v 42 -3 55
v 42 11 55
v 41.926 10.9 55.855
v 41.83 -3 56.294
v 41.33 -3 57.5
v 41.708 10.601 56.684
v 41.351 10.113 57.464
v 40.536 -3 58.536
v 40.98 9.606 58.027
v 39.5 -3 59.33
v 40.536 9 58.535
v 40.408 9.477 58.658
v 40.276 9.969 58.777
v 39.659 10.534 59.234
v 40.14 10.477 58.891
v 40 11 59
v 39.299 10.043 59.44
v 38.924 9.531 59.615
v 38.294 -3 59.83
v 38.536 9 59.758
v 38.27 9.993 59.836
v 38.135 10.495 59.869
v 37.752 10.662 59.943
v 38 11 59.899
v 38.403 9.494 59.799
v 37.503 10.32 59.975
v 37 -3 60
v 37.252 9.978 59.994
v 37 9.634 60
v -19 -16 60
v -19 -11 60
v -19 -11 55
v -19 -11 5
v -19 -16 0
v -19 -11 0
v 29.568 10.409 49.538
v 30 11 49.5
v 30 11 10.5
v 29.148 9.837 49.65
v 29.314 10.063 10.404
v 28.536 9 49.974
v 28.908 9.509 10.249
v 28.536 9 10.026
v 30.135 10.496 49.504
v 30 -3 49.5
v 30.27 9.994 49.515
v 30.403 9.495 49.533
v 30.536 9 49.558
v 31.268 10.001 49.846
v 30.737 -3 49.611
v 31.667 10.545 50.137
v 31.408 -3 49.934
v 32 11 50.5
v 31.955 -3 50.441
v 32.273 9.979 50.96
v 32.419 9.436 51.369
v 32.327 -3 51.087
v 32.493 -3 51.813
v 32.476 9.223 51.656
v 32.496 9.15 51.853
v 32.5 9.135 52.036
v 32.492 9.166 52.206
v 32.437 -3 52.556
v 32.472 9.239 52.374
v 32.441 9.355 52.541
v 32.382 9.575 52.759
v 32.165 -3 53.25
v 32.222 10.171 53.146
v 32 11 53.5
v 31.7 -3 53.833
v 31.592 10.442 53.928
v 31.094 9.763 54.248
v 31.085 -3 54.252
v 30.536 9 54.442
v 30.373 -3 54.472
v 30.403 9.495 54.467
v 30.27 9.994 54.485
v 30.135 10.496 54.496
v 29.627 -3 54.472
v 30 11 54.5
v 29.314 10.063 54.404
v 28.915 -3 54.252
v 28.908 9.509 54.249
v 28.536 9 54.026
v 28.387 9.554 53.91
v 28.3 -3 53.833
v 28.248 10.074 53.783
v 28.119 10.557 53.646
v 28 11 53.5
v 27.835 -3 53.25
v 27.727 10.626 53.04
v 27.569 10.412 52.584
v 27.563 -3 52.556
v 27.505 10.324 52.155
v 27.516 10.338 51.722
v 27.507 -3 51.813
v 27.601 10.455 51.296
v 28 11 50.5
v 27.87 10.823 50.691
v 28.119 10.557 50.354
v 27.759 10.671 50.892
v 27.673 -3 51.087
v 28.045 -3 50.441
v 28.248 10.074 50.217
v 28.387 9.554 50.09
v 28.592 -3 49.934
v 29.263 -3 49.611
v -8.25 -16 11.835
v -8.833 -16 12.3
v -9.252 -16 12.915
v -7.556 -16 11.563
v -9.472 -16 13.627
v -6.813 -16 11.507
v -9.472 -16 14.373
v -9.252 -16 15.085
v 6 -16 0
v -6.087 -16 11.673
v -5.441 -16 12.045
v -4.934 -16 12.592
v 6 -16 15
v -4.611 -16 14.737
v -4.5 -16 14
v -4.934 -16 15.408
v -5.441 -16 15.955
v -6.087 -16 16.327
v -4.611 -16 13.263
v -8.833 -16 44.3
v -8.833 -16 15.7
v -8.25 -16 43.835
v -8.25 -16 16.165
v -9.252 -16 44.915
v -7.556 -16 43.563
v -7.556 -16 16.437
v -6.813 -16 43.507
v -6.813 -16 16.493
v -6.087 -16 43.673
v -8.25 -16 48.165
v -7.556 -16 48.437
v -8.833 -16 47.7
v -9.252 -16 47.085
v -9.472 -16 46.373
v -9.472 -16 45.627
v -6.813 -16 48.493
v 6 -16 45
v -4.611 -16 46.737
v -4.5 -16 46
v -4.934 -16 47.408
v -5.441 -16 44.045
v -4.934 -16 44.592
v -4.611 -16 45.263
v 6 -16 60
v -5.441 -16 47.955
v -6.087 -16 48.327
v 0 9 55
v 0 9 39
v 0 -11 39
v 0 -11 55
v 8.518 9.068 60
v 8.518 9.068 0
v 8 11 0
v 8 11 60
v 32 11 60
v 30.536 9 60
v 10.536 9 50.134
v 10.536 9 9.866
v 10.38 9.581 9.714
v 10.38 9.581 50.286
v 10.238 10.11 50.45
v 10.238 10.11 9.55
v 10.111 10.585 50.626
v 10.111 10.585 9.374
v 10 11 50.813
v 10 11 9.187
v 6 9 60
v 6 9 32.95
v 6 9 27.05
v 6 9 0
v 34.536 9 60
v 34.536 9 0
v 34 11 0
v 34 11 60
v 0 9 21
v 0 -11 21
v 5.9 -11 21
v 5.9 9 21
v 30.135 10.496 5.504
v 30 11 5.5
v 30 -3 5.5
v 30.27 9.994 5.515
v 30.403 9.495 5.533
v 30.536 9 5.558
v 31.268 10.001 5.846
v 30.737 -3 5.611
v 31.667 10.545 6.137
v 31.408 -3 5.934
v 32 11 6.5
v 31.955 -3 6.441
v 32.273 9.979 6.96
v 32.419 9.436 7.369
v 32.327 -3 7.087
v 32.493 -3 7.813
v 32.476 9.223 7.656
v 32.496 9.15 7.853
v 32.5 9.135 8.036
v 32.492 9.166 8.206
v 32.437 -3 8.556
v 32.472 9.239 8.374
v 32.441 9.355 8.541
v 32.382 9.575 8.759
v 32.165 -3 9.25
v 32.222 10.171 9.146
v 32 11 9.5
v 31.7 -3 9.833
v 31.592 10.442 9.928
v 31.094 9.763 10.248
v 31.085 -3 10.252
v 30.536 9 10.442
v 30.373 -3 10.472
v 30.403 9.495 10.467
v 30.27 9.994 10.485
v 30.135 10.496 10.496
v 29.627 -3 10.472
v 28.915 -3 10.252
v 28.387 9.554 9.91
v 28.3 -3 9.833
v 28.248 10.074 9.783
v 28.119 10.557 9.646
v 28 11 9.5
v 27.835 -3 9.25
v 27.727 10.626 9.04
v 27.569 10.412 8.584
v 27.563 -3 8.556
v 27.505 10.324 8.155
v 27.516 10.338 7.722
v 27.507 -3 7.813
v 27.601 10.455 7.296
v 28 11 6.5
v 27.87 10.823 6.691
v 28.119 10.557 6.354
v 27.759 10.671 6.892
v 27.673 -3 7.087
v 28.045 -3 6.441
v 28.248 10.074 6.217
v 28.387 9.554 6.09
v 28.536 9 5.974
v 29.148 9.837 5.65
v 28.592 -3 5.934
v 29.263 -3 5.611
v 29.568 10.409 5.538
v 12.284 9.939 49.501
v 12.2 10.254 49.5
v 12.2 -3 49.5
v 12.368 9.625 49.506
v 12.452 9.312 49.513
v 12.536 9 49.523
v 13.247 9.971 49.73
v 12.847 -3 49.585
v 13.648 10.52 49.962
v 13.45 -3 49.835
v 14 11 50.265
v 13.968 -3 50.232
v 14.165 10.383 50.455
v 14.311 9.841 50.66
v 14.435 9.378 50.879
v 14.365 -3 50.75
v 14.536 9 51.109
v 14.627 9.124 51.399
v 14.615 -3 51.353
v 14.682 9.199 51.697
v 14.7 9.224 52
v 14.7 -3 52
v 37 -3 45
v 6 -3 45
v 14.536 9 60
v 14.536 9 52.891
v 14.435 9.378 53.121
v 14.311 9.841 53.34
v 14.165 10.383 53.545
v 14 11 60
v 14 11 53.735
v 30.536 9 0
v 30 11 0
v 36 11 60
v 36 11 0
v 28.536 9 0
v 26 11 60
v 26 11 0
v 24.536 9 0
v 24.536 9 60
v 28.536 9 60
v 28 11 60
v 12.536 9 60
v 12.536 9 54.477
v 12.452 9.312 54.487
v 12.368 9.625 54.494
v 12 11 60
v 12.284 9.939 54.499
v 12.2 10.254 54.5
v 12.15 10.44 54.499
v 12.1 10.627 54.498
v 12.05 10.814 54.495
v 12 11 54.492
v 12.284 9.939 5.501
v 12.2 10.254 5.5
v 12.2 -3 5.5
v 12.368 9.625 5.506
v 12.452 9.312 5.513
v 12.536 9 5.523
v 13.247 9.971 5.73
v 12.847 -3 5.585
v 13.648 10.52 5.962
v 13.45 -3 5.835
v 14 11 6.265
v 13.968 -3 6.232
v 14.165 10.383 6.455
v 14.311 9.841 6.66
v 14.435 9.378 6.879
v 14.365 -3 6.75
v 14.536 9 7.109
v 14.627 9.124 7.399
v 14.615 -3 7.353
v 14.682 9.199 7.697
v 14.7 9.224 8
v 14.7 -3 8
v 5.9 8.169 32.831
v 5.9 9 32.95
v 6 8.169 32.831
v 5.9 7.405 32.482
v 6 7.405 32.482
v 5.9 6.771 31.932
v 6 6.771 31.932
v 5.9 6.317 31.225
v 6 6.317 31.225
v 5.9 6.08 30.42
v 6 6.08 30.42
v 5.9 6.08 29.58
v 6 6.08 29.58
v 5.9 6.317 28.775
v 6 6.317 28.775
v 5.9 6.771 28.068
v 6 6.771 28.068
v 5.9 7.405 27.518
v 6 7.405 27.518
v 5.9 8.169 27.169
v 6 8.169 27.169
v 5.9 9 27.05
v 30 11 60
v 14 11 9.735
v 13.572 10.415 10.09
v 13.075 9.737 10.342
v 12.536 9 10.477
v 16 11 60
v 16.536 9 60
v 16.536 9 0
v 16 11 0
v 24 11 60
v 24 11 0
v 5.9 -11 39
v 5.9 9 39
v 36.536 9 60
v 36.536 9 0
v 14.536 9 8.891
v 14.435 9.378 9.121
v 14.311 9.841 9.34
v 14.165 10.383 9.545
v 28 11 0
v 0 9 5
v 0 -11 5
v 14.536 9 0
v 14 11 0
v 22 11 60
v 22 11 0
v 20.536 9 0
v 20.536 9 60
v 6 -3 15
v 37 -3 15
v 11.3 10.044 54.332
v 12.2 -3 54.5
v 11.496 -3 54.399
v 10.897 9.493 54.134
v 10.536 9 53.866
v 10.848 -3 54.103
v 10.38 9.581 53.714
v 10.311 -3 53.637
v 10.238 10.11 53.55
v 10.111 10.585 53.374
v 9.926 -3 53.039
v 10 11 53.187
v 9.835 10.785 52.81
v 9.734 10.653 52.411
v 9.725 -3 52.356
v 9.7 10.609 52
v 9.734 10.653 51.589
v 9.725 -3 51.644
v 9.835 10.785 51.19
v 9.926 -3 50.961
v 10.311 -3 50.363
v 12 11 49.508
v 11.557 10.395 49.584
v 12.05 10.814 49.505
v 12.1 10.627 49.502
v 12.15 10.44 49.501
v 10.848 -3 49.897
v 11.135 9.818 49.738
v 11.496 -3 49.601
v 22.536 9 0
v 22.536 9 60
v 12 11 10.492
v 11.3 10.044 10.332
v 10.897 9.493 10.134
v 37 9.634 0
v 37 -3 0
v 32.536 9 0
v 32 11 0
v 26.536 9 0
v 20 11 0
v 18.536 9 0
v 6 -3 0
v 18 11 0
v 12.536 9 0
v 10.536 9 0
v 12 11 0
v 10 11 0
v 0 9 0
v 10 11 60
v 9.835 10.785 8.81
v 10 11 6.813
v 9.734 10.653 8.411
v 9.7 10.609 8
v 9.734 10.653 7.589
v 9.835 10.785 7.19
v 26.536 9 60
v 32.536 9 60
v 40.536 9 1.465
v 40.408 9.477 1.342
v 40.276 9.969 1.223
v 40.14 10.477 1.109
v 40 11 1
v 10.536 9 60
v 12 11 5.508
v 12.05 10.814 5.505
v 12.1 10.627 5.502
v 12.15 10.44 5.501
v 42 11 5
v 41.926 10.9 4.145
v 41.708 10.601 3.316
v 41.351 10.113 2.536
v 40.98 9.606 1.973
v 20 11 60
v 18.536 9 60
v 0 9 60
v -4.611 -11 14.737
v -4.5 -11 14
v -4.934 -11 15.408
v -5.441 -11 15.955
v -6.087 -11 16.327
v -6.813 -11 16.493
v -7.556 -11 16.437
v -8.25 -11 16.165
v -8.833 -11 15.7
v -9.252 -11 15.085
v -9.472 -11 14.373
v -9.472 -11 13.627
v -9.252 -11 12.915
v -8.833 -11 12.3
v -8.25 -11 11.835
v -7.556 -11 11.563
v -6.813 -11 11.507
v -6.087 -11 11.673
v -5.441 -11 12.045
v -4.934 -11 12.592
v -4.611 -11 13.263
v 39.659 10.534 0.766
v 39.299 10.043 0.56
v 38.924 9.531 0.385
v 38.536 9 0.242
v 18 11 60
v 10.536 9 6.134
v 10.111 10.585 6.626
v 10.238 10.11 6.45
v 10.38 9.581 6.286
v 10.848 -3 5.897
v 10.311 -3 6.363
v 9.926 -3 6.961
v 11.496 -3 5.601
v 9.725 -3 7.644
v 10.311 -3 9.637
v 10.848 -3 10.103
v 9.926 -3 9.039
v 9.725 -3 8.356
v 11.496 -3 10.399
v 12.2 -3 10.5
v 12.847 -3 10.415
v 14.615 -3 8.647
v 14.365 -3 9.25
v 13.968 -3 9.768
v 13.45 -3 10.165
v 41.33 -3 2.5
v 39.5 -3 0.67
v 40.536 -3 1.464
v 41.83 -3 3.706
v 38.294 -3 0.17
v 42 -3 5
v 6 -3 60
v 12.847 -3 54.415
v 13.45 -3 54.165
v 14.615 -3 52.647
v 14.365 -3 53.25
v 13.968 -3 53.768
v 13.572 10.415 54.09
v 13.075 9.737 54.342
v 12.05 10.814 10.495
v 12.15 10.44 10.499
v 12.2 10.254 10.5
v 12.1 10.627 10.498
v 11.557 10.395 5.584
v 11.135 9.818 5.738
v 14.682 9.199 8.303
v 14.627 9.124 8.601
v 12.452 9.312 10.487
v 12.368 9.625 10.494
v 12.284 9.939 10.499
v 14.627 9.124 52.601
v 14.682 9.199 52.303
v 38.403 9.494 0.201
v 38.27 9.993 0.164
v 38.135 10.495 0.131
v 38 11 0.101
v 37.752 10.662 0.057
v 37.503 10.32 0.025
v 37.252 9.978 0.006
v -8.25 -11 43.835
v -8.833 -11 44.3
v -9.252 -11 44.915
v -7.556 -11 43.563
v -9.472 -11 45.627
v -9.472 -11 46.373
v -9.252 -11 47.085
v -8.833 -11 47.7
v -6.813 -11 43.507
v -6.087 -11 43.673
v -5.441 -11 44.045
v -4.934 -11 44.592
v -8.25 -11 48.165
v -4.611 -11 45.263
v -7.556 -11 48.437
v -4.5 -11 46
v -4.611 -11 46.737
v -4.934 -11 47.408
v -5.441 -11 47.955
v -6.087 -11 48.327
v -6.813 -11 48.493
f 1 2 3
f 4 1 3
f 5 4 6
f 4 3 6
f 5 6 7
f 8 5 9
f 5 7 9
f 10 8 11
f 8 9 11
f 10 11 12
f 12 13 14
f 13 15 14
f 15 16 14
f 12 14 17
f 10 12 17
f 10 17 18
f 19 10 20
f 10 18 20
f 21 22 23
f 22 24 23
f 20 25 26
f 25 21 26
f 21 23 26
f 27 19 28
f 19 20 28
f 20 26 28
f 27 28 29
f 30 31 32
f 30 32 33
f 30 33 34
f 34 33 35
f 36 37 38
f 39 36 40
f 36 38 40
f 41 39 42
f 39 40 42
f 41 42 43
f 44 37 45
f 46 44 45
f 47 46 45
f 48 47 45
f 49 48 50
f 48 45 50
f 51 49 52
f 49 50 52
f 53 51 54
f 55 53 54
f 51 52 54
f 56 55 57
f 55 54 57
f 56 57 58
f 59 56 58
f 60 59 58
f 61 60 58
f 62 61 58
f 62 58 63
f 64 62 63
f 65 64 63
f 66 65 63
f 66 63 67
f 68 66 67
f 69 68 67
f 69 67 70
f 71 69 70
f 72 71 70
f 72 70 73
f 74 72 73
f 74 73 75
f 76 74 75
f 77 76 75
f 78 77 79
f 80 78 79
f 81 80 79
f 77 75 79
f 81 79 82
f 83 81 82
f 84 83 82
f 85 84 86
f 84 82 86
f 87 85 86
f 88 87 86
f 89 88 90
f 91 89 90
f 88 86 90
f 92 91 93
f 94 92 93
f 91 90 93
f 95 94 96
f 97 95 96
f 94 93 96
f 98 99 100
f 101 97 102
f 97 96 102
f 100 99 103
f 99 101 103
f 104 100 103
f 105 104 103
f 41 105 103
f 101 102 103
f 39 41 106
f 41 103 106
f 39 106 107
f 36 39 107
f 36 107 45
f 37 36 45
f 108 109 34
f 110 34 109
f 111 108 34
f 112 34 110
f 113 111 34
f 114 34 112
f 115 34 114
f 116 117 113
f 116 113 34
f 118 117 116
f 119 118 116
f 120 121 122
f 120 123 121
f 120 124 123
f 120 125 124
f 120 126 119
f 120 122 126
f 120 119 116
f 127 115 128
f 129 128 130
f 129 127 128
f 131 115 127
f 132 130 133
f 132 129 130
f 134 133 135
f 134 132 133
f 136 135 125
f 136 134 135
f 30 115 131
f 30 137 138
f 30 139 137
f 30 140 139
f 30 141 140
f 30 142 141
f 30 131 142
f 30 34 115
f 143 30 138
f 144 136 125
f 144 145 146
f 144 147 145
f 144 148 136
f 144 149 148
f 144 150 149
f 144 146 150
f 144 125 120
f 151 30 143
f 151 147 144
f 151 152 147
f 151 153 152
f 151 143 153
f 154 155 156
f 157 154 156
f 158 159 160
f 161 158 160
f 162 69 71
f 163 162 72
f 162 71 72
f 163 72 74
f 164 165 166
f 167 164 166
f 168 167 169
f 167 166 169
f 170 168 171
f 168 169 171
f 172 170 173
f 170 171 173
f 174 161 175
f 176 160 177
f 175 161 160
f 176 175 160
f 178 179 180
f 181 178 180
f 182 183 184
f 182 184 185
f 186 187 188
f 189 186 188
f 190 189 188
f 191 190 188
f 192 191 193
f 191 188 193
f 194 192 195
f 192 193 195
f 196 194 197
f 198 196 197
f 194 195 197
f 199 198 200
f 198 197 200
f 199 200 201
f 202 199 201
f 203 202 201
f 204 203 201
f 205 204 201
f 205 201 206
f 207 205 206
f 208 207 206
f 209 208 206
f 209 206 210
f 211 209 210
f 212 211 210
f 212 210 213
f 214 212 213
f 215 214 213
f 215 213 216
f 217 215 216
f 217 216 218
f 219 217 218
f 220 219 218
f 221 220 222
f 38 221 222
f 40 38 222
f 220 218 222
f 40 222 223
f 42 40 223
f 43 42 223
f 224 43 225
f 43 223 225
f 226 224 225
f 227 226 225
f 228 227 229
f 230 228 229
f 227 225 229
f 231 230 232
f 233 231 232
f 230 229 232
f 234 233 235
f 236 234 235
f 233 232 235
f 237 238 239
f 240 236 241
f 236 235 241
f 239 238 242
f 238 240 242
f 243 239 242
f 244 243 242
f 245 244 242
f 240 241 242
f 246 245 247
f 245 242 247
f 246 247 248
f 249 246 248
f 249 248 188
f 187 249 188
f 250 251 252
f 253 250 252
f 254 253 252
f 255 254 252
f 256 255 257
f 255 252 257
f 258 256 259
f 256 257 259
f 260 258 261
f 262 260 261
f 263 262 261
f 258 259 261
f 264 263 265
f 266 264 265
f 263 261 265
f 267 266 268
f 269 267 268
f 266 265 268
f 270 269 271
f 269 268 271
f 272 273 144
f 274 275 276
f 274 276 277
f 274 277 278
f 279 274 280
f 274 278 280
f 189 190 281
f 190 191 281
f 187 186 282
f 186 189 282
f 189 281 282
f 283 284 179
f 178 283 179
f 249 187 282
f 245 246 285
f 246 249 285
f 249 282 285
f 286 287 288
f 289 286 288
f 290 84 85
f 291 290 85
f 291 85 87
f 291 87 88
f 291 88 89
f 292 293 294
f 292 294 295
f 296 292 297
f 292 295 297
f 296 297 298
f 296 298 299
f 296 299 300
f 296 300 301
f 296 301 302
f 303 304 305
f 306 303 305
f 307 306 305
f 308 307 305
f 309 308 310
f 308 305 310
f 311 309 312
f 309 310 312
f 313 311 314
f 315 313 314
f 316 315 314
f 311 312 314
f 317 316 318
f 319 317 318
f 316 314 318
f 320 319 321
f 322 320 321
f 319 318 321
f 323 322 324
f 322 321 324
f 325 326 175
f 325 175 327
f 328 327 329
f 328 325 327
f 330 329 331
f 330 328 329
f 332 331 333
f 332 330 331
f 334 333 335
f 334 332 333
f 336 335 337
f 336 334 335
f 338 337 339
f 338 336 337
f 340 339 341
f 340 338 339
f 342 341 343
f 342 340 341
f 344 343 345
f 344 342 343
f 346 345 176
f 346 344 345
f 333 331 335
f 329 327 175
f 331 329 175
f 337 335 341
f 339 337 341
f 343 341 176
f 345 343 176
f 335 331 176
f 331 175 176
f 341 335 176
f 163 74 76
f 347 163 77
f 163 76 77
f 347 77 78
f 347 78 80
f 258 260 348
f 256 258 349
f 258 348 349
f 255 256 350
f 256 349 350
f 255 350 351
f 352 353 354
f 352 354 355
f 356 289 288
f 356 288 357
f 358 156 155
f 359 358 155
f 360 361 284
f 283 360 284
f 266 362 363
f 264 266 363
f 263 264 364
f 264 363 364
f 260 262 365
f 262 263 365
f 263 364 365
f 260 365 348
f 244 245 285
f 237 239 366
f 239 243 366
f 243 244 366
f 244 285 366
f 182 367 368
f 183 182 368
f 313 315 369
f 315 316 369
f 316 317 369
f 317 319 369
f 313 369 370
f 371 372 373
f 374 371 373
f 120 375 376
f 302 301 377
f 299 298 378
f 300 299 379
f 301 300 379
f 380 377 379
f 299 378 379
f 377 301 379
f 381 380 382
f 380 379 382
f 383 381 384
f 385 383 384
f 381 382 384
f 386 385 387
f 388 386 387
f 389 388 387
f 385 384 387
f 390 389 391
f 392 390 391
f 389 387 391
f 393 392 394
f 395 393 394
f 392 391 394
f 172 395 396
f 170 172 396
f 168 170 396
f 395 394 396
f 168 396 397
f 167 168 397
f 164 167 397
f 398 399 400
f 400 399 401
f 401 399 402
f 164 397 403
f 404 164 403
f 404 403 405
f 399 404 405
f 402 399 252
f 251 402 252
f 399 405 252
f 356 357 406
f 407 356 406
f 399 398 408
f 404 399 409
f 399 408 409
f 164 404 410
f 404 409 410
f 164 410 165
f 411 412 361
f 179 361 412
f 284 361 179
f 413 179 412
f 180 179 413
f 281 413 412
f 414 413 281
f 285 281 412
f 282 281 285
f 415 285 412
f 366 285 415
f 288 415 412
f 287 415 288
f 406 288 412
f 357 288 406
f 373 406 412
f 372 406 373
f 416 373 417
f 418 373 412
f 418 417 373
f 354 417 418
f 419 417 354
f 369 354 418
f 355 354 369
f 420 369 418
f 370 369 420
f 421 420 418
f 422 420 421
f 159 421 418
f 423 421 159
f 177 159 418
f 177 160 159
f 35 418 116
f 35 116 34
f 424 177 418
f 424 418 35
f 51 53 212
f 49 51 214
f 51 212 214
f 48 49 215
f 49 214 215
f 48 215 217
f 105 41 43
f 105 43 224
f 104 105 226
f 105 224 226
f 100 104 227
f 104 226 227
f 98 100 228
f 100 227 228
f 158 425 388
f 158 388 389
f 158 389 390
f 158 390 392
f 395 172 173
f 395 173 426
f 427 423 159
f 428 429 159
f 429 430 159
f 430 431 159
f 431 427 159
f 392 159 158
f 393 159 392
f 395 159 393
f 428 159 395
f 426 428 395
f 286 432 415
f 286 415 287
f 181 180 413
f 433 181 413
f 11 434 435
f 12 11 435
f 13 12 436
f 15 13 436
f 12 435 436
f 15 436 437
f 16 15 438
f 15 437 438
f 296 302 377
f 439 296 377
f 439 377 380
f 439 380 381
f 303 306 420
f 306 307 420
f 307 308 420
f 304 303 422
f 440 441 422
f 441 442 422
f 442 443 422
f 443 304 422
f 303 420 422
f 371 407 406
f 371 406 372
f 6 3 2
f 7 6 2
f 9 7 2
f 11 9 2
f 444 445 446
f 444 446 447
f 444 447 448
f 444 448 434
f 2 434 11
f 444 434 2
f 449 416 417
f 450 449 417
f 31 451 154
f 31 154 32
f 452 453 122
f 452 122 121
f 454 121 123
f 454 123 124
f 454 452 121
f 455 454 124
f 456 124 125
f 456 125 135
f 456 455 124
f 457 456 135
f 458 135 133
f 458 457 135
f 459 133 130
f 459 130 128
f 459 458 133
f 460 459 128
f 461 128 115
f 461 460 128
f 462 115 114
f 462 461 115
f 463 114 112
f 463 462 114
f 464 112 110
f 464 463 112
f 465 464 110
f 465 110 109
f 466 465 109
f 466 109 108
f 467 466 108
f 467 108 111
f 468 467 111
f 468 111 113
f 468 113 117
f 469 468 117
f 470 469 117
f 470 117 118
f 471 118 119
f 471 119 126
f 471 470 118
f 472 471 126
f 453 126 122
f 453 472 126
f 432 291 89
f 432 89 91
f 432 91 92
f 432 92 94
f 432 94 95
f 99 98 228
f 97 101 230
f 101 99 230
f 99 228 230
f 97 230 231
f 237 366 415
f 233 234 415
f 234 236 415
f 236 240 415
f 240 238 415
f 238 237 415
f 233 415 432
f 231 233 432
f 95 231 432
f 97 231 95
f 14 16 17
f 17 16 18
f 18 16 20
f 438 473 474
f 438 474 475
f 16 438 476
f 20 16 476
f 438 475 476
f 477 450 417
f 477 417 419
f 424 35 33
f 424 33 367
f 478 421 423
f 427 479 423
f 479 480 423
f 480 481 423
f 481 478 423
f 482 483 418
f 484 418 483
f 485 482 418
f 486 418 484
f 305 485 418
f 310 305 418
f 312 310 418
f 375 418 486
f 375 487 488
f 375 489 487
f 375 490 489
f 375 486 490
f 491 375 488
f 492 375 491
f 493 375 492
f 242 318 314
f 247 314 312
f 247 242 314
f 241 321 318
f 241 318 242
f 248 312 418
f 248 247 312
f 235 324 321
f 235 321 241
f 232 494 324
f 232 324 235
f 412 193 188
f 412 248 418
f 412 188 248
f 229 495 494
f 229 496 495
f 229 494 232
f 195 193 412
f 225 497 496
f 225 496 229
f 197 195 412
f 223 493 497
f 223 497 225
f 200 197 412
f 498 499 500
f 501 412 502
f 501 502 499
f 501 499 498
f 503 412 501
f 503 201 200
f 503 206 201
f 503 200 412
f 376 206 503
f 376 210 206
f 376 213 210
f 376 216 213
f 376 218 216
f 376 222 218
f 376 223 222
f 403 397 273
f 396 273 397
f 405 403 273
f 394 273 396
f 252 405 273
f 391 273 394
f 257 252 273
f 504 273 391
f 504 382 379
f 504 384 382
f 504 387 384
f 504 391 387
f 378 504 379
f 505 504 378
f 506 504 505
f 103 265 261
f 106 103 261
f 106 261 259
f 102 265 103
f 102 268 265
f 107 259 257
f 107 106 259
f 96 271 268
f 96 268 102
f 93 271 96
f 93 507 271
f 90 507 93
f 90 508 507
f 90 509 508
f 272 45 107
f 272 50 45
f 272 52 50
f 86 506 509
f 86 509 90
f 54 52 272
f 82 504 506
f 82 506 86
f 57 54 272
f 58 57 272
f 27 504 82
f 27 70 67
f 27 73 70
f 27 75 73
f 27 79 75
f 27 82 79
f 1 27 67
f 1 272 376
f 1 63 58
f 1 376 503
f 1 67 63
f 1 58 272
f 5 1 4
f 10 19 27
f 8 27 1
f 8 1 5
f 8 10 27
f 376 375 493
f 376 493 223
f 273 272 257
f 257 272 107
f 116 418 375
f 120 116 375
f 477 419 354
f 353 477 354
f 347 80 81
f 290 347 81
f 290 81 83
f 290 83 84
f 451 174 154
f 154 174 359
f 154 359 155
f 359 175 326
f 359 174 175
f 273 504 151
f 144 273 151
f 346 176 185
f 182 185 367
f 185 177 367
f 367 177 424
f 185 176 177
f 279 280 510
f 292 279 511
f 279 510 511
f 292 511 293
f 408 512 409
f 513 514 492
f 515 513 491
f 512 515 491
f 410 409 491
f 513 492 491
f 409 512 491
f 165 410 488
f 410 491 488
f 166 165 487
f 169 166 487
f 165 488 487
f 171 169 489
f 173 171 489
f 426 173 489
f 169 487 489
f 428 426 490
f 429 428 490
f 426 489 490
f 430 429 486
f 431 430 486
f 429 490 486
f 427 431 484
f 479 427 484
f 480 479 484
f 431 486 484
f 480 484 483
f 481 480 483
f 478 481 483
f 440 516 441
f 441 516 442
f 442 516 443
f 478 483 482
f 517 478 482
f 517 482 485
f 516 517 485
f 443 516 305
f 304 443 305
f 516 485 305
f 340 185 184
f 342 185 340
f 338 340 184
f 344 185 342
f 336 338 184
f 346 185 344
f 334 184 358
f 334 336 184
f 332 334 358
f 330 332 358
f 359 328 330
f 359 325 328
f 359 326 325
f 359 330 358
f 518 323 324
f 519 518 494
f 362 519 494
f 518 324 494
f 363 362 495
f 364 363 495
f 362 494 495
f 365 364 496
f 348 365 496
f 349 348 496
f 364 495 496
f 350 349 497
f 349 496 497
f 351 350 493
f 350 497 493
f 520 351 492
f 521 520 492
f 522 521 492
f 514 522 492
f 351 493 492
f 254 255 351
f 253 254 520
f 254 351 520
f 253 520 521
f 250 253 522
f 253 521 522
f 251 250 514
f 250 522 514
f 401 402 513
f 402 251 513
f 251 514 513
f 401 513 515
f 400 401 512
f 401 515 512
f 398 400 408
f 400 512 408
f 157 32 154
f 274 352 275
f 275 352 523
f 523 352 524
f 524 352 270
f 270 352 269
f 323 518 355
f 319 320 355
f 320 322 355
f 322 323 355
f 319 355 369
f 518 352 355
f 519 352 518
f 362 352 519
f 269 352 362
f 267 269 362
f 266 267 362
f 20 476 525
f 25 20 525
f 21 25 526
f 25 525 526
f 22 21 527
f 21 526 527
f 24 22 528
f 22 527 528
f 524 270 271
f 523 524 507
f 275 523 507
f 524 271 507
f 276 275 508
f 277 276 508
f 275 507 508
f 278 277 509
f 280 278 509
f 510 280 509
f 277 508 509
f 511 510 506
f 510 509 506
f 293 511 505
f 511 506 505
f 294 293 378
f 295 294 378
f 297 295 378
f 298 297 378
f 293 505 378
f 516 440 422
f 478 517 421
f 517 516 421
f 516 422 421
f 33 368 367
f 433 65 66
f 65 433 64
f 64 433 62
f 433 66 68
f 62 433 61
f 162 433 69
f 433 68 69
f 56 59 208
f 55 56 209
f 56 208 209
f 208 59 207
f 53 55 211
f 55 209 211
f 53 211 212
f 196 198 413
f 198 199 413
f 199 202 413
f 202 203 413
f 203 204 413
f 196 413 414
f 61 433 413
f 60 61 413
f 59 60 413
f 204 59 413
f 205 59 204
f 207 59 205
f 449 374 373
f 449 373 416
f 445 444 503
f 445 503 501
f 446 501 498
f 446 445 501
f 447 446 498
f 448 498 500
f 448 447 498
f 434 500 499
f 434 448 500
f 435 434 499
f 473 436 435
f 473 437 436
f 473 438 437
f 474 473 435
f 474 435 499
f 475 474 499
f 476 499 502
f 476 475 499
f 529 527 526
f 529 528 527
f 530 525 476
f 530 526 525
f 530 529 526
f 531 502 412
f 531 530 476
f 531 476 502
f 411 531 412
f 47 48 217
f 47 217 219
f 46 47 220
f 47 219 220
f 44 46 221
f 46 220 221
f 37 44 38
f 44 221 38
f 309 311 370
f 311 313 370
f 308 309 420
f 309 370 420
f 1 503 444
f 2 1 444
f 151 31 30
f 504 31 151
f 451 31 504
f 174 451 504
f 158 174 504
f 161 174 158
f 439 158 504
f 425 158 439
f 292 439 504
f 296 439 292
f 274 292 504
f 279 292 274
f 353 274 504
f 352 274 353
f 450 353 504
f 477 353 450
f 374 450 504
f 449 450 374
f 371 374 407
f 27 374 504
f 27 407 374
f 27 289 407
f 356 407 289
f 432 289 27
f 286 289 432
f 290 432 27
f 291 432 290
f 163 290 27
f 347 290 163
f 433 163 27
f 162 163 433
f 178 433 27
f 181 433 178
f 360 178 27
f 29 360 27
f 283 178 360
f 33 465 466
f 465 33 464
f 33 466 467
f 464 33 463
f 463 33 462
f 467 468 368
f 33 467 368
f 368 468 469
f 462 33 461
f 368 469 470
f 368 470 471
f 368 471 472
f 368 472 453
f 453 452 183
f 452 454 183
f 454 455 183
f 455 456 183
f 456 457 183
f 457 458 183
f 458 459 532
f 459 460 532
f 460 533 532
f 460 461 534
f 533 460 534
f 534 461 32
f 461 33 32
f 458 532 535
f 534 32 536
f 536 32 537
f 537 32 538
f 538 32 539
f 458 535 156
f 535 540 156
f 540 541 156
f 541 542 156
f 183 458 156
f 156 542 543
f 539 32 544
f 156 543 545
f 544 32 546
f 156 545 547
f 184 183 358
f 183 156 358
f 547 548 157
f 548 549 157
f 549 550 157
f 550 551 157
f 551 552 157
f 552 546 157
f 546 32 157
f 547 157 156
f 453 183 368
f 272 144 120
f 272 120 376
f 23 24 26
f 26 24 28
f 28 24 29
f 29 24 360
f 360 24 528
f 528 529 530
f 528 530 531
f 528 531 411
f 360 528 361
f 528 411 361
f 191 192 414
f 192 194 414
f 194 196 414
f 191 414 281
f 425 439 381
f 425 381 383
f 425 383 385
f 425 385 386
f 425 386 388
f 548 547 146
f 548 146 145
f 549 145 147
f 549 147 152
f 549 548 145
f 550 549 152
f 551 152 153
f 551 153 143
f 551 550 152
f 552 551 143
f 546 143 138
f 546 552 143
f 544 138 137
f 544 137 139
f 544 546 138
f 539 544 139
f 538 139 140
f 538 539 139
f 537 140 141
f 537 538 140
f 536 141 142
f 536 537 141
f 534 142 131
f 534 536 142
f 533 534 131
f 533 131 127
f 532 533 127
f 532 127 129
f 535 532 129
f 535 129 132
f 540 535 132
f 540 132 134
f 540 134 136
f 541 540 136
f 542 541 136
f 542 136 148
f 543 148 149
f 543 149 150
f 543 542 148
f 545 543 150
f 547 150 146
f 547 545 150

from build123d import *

# Parameters (mm, degrees)
EXTRUDE_1_DEPTH     = 60
FILLET_1_R          = 5
SKETCH_3_R          = 2.5
CUT_EXTRUDE_2_DEPTH = 77.472217177
CUT_EXTRUDE_4_DEPTH = 6
SKETCH_6_W          = 18
SKETCH_6_H          = 20
CUT_EXTRUDE_5_DEPTH = 5.9
SKETCH_7_R          = 2.5
EXTRUDE_2_DEPTH     = 5
CUT_EXTRUDE_START   = -8
CUT_EXTRUDE_6_DEPTH = 8
EXTRUDE_3_DEPTH     = 5
EXTRUDE_4_DEPTH     = 5
EXTRUDE_5_DEPTH     = 45
CUT_EXTRUDE_7_DEPTH = 15


with BuildPart() as part:
    # 草图1 → 凸台-拉伸1 (new body)
    with BuildSketch(Plane.XY):
        Polygon((0, 9), (0, -11), (42, -11), (42, 11), (40.535898385, 9), (40, 11), (38.535898385, 9), (38, 11), (36.535898385, 9), (36, 11), (34.535898385, 9), (34, 11), (32.535898385, 9), (32, 11), (30.535898385, 9), (30, 11), (28.535898385, 9), (28, 11), (26.535898385, 9), (26, 11), (24.535898385, 9), (24, 11), (22.535898385, 9), (22, 11), (20.535898385, 9), (20, 11), (18.535898385, 9), (18, 11), (16.535898385, 9), (16, 11), (14.535898385, 9), (14, 11), (12.535898385, 9), (12, 11), (10.535898385, 9), (10, 11), (8.51763809, 9.068148347), (8, 11), (6, 9), align=None)
    extrude(amount=EXTRUDE_1_DEPTH)

    # 圆角1
    fillet_1_edges = [part.edges().sort_by_distance(p)[0] for p in [
        (42, 0, 0),
        (42, 0, 60),
    ]]
    fillet(fillet_1_edges, radius=FILLET_1_R)

    # 草图3 → 切除-拉伸2 (cut, through all)
    with BuildSketch(Plane.XZ.offset(11)):
        with Locations(Location((30, 8, 0), (0, 0, 270))):
            Circle(SKETCH_3_R)
        with BuildLine():
            ThreePointArc((14.7, 52), (13.967766953, 53.767766953), (12.2, 54.5))
            Line((12.2, 54.5), (12.2, 49.5))
            ThreePointArc((12.2, 49.5), (13.967766953, 50.232233047), (14.7, 52))
        make_face()
        with BuildLine():
            Line((12.2, 49.5), (12.2, 54.5))
            ThreePointArc((12.2, 54.5), (9.7, 52), (12.2, 49.5))
        make_face()
        with BuildLine():
            ThreePointArc((14.7, 8), (13.967766953, 9.767766953), (12.2, 10.5))
            Line((12.2, 10.5), (12.2, 5.5))
            ThreePointArc((12.2, 5.5), (13.967766953, 6.232233047), (14.7, 8))
        make_face()
        with BuildLine():
            Line((12.2, 5.5), (12.2, 10.5))
            ThreePointArc((12.2, 10.5), (9.7, 8), (12.2, 5.5))
        make_face()
        with Locations(Location((30, 52, 0), (0, 0, 270))):
            Circle(SKETCH_3_R)
    extrude(amount=-CUT_EXTRUDE_2_DEPTH, mode=Mode.SUBTRACT)

    # 草图5 → 切除-拉伸4 (cut)
    with BuildSketch(Plane.ZY):
        with BuildLine():
            Line((27.05, 9), (32.95, 9))
            ThreePointArc((32.95, 9), (30, 6.05), (27.05, 9))
        make_face()
    extrude(amount=-CUT_EXTRUDE_4_DEPTH, mode=Mode.SUBTRACT)

    # 草图6 → 切除-拉伸5 (cut)
    with BuildSketch(Plane.ZY):
        with Locations((30, -1)):
            Rectangle(SKETCH_6_W, SKETCH_6_H)
    extrude(amount=-CUT_EXTRUDE_5_DEPTH, mode=Mode.SUBTRACT)

    # 草图8 → 切除-拉伸6 (cut)
    with BuildSketch(Plane.XZ.offset(11).offset(CUT_EXTRUDE_START)):
        with BuildLine():
            Line((6, 60), (6, 0))
            Line((6, 0), (37, 0))
            ThreePointArc((37, 0), (40.535533906, 1.464466094), (42, 5))
            Line((42, 5), (42, 55))
            ThreePointArc((42, 55), (40.535533906, 58.535533906), (37, 60))
            Line((37, 60), (6, 60))
        make_face()
    extrude(amount=CUT_EXTRUDE_6_DEPTH, mode=Mode.SUBTRACT)



with BuildPart() as body_2:
    # 草图7 → 凸台-拉伸2 (new body)
    # profile 1 of 3: a face of its own
    with BuildSketch(Plane.XZ.offset(11)):
        Polygon((0, 39), (0, 60), (-19, 60), (-19, 0), (0, 0), (0, 21), (5.9, 21), (5.9, 30), (5.9, 39), align=None)
        with Locations((-7, 14)):
            Circle(SKETCH_7_R, mode=Mode.SUBTRACT)
        with Locations((-7, 46)):
            Circle(SKETCH_7_R, mode=Mode.SUBTRACT)
    # profile 2 of 3: a face of its own
    with BuildSketch(Plane.XZ.offset(11)):
        Polygon((6, 30), (6, 60), (0, 60), (0, 39), (5.9, 39), (5.9, 30), align=None)
    # profile 3 of 3: a face of its own
    with BuildSketch(Plane.XZ.offset(11)):
        Polygon((6, 0), (6, 30), (5.9, 30), (5.9, 21), (0, 21), (0, 0), align=None)
    extrude(amount=EXTRUDE_2_DEPTH)


with BuildPart() as part_1:
    add(part.part)

    add(body_2.part)  # 凸台-拉伸3 merges body 2
    # 草图9 → 凸台-拉伸3 (add)
    with BuildSketch(Plane.XY.offset(60)):
        Polygon((0, 9), (-19, -11), (0, -11), align=None)
    extrude(amount=-EXTRUDE_3_DEPTH)

    # 草图10 → 凸台-拉伸4 (add)
    with BuildSketch(Plane(origin=(0, 0, 0), x_dir=(-1, 0, 0), z_dir=(0, 0, -1))):
        Polygon((0, 9), (0, -11), (19, -11), align=None)
    extrude(amount=-EXTRUDE_4_DEPTH)

    # 草图11 → 凸台-拉伸5 (add)
    with BuildSketch(Plane.XY.offset(60)):
        Polygon((6, -3), (6, -16), (37, -3), align=None)
    extrude(amount=-EXTRUDE_5_DEPTH)

    # 草图12 → 切除-拉伸7 (cut)
    with BuildSketch(Plane.XY.offset(60)):
        Polygon((37, -3), (6, -3), (6, -16), align=None)
    extrude(amount=-CUT_EXTRUDE_7_DEPTH, mode=Mode.SUBTRACT)


solid = part_1.part
